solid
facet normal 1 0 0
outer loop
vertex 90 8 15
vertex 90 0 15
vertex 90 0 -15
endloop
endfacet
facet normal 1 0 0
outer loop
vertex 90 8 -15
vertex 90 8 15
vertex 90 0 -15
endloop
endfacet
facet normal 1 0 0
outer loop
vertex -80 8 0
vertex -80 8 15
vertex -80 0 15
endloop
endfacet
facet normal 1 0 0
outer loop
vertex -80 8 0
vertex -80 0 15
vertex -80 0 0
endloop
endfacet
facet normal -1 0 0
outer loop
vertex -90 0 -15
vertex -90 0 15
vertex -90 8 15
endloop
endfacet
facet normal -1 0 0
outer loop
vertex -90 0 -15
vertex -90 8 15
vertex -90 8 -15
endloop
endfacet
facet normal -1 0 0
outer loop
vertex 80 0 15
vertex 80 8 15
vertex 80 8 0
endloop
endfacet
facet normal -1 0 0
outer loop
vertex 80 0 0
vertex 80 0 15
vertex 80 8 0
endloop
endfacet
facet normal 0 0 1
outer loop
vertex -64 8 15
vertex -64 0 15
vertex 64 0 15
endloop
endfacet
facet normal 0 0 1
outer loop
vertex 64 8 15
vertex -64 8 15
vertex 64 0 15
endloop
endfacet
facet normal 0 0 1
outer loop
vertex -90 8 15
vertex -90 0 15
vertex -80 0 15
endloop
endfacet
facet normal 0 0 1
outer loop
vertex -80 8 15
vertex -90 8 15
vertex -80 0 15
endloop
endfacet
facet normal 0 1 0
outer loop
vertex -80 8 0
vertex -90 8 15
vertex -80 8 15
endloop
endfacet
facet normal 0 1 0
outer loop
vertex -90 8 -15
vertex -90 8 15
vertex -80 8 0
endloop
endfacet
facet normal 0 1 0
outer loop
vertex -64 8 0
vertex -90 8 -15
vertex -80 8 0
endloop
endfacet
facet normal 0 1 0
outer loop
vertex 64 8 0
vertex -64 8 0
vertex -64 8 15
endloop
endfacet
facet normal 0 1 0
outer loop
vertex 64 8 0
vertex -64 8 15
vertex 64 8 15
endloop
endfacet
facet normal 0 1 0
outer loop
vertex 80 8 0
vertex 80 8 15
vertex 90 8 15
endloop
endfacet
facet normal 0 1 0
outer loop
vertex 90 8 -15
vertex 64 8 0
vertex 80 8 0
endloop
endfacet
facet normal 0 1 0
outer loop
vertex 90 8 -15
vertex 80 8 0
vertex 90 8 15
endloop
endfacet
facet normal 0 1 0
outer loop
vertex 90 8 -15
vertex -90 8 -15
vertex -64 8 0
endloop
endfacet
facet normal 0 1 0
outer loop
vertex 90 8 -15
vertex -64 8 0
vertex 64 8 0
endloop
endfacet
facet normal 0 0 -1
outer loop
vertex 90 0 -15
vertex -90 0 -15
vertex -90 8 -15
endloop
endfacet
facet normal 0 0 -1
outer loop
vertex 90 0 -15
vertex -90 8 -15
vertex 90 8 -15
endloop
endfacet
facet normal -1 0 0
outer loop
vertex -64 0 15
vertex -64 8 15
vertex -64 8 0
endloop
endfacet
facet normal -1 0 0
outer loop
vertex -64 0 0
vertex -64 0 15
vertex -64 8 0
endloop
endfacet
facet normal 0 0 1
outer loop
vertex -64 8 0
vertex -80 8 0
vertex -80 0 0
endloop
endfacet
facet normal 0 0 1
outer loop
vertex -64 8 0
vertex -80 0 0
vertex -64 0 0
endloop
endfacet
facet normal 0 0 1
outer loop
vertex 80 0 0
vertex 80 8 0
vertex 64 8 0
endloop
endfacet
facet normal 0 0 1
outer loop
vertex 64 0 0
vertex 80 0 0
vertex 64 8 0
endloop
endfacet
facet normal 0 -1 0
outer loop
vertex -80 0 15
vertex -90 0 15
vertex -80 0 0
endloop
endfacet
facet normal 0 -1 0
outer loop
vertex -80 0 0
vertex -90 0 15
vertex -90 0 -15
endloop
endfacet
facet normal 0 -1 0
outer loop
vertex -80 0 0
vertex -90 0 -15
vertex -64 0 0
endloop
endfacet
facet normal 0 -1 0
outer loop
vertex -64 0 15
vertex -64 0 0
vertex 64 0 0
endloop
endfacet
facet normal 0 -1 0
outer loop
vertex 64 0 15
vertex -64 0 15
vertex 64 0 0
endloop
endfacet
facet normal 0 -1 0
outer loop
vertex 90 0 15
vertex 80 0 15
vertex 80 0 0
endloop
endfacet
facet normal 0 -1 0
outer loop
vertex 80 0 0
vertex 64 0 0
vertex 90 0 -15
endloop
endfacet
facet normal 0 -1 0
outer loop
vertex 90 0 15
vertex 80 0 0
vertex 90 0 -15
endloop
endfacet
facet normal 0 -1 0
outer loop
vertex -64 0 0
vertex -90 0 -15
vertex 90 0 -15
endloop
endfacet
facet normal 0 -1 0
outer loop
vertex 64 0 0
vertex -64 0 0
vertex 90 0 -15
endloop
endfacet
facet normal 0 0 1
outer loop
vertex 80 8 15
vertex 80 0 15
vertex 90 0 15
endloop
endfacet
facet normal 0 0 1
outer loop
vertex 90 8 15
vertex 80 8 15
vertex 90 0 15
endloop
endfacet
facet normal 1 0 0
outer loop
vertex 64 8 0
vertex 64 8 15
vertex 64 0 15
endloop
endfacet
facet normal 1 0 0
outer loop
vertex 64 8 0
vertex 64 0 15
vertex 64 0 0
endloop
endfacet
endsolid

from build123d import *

# Parameters (mm, degrees)
SKETCH1_W           = 180
SKETCH1_H           = 30
BOSS_EXTRUDE1_DEPTH = 8
SKETCH3_W           = 16
SKETCH3_H           = 15
CUT_EXTRUDE1_DEPTH  = 8


with BuildPart() as part:
    # Sketch1 → Boss-Extrude1 (new body)
    with BuildSketch(Plane(origin=(0, 0, 0), x_dir=(1, 0, 0), z_dir=(0, 1, 0))):
        Rectangle(SKETCH1_W, SKETCH1_H)
    extrude(amount=BOSS_EXTRUDE1_DEPTH)

    # Sketch3 → Cut-Extrude1 (cut)
    with BuildSketch(Plane(origin=(0, 8, 0), x_dir=(1, 0, 0), z_dir=(0, 1, 0))):
        with Locations((-72, -7.5)):
            Rectangle(SKETCH3_W, SKETCH3_H)
    cut_extrude1 = extrude(amount=-CUT_EXTRUDE1_DEPTH, mode=Mode.SUBTRACT)

    # Mirror1: Cut-Extrude1 across plane
    add(cut_extrude1.mirror(Plane(origin=(0, 0, 0), x_dir=(0, 0, 1), z_dir=(1, 0, 0))), mode=Mode.SUBTRACT)


solid = part.part
